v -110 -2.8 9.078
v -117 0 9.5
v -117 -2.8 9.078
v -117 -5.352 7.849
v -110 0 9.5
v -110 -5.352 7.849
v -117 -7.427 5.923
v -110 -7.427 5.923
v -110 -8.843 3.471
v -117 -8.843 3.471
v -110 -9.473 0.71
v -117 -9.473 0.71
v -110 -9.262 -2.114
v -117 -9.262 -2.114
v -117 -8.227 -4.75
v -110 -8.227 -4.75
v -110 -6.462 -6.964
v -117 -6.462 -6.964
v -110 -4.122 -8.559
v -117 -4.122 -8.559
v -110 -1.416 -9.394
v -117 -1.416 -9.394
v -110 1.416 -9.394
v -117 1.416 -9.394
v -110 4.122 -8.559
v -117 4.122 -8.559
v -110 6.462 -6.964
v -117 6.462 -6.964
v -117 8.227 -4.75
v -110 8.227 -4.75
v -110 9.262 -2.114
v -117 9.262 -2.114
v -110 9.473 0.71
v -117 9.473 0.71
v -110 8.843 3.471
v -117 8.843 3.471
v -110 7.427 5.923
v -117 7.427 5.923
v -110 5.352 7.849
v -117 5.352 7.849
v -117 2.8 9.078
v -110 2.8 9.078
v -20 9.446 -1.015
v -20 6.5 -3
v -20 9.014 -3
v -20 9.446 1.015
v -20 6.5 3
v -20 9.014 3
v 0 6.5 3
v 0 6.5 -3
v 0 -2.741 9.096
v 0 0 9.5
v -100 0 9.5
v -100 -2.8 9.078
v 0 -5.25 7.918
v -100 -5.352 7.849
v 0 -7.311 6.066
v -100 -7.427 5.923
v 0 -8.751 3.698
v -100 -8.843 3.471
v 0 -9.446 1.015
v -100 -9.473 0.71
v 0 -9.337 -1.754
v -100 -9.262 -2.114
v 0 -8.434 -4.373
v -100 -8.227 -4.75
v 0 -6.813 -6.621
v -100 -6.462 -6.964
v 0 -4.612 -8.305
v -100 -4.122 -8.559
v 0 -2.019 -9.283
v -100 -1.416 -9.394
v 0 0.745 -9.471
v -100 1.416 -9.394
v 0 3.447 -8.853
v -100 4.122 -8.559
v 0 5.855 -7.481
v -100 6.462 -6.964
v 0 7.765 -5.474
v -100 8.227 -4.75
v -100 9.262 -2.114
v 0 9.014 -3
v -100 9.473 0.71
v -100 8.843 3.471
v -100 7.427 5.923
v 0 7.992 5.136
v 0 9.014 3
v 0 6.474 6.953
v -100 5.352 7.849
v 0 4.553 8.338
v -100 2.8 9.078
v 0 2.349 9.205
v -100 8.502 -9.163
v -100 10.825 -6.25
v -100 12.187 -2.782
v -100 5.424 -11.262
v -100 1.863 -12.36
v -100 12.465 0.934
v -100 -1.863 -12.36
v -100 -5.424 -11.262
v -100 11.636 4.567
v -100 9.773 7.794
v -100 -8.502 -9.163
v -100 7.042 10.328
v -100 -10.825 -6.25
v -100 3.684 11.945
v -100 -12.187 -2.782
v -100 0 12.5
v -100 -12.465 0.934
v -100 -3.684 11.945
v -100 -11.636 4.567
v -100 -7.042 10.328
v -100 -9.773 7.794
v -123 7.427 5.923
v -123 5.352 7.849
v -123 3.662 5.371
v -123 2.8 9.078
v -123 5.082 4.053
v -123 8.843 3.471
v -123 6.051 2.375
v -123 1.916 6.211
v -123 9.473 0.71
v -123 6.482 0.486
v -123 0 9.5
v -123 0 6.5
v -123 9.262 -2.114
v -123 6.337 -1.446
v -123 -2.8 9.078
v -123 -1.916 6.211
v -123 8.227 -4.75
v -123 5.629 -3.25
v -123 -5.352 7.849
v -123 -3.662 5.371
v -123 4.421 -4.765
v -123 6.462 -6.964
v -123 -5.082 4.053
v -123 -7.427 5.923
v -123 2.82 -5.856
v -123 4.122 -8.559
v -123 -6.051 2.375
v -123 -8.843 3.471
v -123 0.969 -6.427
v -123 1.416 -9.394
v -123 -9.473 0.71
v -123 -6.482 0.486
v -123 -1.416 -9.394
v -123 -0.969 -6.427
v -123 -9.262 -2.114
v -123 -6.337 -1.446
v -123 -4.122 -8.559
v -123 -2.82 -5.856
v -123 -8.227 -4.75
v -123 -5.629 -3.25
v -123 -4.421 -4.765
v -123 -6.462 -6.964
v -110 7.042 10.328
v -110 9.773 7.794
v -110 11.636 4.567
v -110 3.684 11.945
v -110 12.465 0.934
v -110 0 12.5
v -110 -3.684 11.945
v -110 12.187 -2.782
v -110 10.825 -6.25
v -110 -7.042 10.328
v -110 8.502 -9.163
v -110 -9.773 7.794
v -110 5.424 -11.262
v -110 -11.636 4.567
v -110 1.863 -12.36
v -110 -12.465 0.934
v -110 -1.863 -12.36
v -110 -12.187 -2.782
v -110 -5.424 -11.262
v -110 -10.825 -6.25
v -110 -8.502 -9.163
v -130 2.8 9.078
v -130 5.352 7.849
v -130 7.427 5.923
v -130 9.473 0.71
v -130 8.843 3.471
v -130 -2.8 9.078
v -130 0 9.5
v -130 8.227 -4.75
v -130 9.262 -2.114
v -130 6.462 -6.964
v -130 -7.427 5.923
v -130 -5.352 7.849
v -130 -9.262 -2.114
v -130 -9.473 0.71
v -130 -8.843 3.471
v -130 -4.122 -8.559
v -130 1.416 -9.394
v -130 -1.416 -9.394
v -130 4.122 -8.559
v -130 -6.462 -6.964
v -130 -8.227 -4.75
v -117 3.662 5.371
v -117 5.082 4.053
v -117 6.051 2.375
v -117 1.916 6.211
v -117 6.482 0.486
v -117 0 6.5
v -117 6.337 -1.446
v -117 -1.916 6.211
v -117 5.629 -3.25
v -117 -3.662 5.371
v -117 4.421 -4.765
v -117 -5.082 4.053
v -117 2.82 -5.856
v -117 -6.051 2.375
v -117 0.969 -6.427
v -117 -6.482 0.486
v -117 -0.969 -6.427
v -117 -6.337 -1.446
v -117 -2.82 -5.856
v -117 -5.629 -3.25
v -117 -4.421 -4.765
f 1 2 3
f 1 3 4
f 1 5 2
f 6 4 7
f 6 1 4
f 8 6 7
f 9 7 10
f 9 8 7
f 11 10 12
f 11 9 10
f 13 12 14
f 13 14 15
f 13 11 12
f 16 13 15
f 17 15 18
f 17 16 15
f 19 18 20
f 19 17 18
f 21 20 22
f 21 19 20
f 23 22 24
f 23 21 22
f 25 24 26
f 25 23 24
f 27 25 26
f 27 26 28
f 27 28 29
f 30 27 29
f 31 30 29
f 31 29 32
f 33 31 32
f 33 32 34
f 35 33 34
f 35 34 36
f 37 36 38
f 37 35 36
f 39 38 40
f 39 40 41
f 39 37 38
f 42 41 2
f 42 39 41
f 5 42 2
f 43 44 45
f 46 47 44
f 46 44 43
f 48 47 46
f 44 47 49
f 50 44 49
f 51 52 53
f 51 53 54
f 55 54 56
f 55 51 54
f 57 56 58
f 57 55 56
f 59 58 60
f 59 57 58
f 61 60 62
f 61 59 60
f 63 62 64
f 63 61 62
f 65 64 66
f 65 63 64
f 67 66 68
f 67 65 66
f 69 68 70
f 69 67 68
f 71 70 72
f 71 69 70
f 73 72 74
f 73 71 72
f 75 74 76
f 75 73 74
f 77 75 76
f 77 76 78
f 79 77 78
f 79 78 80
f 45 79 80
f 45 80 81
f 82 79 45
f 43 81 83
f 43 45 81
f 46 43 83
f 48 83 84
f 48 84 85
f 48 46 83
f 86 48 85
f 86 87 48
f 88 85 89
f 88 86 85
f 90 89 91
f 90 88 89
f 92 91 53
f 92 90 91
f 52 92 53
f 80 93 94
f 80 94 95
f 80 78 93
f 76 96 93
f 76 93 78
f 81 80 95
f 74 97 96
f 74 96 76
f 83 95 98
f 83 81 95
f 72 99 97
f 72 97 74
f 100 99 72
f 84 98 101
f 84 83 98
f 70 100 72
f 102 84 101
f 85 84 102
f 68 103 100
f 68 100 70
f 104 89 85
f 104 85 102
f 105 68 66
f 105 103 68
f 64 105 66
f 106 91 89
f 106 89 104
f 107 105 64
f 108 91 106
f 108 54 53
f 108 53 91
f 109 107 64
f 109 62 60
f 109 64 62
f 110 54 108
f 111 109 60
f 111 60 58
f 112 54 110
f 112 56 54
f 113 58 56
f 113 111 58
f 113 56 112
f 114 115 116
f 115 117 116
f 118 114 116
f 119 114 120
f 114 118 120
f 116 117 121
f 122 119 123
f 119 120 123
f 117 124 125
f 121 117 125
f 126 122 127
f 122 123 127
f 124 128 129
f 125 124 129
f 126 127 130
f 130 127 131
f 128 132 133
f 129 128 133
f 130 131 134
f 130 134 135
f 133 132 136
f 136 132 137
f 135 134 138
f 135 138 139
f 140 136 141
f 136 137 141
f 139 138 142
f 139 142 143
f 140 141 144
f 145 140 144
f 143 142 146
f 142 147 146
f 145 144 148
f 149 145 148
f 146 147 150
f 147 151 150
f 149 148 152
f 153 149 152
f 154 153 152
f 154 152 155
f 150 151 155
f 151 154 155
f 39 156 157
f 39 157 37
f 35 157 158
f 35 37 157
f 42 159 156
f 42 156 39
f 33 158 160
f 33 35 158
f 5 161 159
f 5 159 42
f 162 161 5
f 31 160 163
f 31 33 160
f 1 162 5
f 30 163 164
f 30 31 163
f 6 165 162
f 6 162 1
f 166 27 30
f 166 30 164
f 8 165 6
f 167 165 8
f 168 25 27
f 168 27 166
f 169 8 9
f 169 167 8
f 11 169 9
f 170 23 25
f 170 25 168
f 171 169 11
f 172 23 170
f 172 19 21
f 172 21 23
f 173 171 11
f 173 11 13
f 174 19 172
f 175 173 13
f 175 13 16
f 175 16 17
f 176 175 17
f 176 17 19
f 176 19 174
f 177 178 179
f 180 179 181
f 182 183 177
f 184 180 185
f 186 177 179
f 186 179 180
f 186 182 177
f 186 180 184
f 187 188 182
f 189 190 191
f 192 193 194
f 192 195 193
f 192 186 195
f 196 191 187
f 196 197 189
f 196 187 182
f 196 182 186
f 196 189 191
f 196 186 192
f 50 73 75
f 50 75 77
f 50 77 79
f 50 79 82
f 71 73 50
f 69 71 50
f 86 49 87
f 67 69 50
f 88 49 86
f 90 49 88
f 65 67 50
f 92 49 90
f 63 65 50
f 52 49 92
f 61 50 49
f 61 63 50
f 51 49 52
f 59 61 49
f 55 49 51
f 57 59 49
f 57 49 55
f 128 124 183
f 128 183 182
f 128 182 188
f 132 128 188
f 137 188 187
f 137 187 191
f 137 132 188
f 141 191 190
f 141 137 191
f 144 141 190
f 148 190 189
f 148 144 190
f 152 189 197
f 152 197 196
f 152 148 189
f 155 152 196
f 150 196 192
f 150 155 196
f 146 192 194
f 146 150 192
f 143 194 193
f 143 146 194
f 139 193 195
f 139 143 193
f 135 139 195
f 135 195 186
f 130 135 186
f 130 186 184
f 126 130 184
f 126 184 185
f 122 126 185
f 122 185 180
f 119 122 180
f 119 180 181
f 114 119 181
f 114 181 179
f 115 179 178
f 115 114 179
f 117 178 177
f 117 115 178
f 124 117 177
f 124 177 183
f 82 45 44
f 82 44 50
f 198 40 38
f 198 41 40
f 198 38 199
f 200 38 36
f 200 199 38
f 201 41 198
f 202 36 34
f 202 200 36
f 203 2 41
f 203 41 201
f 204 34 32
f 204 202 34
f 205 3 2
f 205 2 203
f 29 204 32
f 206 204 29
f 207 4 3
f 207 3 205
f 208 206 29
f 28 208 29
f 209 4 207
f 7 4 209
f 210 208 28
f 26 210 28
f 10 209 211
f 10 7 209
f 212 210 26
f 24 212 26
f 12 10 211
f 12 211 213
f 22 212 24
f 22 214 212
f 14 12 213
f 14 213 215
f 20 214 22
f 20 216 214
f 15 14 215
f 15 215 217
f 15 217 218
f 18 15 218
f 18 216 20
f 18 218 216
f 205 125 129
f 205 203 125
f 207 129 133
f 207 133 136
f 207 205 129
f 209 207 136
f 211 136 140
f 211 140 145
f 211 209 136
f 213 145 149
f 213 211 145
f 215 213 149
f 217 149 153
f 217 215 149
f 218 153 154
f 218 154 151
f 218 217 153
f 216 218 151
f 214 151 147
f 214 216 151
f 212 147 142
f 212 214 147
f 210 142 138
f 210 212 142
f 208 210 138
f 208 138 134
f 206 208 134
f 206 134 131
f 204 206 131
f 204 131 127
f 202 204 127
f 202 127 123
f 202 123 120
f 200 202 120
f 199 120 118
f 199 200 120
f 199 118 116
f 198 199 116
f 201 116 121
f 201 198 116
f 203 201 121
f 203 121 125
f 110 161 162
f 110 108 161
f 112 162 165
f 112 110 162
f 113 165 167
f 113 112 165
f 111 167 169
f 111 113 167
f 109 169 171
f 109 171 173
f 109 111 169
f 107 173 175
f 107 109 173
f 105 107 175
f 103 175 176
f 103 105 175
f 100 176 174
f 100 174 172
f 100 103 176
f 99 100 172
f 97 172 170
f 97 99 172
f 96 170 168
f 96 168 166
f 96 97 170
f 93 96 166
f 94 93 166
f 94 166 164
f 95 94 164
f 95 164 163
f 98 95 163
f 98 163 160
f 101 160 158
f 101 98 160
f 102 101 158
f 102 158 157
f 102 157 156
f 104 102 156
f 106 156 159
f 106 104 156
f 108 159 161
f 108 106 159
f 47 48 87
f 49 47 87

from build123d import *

# Parameters (mm, degrees)
SKETCH2_W          = 6
SKETCH2_H          = 3
SKETCH3_W          = 20
SKETCH3_H          = 3
CUT_EXTRUDE1_DEPTH = 3


with BuildPart() as part:
    # Sketch1 → Revolve1 (revolve)
    with BuildSketch(Plane.XY, mode=Mode.PRIVATE) as revolve1_sk:
        Polygon((-110, 9.5), (-110, 12.5), (-100, 12.5), (-100, 9.5), (0, 9.5), (0, 0), (-130, 0), (-130, 9.5), align=None)
    revolve(revolve1_sk.sketch.rotate(Axis((0.866713413, 0, 0), (1, 0, 0)), 90), axis=Axis((0.866713413, 0, 0), (1, 0, 0)))

    # Sketch2 → Cut-Revolve1 (revolve, cut)
    with BuildSketch(Plane.XY, mode=Mode.PRIVATE) as cut_revolve1_sk:
        with Locations((-120, 8)):
            Rectangle(SKETCH2_W, SKETCH2_H)
    revolve(cut_revolve1_sk.sketch.rotate(Axis((-130, 0, 0), (1, 0, 0)), 90), axis=Axis((-130, 0, 0), (1, 0, 0)), mode=Mode.SUBTRACT)

    # Sketch3 → Cut-Extrude1 (cut, symmetric)
    with BuildSketch(Plane.XY):
        with Locations((-10, 8)):
            Rectangle(SKETCH3_W, SKETCH3_H)
    extrude(amount=CUT_EXTRUDE1_DEPTH, both=True, mode=Mode.SUBTRACT)


solid = part.part
